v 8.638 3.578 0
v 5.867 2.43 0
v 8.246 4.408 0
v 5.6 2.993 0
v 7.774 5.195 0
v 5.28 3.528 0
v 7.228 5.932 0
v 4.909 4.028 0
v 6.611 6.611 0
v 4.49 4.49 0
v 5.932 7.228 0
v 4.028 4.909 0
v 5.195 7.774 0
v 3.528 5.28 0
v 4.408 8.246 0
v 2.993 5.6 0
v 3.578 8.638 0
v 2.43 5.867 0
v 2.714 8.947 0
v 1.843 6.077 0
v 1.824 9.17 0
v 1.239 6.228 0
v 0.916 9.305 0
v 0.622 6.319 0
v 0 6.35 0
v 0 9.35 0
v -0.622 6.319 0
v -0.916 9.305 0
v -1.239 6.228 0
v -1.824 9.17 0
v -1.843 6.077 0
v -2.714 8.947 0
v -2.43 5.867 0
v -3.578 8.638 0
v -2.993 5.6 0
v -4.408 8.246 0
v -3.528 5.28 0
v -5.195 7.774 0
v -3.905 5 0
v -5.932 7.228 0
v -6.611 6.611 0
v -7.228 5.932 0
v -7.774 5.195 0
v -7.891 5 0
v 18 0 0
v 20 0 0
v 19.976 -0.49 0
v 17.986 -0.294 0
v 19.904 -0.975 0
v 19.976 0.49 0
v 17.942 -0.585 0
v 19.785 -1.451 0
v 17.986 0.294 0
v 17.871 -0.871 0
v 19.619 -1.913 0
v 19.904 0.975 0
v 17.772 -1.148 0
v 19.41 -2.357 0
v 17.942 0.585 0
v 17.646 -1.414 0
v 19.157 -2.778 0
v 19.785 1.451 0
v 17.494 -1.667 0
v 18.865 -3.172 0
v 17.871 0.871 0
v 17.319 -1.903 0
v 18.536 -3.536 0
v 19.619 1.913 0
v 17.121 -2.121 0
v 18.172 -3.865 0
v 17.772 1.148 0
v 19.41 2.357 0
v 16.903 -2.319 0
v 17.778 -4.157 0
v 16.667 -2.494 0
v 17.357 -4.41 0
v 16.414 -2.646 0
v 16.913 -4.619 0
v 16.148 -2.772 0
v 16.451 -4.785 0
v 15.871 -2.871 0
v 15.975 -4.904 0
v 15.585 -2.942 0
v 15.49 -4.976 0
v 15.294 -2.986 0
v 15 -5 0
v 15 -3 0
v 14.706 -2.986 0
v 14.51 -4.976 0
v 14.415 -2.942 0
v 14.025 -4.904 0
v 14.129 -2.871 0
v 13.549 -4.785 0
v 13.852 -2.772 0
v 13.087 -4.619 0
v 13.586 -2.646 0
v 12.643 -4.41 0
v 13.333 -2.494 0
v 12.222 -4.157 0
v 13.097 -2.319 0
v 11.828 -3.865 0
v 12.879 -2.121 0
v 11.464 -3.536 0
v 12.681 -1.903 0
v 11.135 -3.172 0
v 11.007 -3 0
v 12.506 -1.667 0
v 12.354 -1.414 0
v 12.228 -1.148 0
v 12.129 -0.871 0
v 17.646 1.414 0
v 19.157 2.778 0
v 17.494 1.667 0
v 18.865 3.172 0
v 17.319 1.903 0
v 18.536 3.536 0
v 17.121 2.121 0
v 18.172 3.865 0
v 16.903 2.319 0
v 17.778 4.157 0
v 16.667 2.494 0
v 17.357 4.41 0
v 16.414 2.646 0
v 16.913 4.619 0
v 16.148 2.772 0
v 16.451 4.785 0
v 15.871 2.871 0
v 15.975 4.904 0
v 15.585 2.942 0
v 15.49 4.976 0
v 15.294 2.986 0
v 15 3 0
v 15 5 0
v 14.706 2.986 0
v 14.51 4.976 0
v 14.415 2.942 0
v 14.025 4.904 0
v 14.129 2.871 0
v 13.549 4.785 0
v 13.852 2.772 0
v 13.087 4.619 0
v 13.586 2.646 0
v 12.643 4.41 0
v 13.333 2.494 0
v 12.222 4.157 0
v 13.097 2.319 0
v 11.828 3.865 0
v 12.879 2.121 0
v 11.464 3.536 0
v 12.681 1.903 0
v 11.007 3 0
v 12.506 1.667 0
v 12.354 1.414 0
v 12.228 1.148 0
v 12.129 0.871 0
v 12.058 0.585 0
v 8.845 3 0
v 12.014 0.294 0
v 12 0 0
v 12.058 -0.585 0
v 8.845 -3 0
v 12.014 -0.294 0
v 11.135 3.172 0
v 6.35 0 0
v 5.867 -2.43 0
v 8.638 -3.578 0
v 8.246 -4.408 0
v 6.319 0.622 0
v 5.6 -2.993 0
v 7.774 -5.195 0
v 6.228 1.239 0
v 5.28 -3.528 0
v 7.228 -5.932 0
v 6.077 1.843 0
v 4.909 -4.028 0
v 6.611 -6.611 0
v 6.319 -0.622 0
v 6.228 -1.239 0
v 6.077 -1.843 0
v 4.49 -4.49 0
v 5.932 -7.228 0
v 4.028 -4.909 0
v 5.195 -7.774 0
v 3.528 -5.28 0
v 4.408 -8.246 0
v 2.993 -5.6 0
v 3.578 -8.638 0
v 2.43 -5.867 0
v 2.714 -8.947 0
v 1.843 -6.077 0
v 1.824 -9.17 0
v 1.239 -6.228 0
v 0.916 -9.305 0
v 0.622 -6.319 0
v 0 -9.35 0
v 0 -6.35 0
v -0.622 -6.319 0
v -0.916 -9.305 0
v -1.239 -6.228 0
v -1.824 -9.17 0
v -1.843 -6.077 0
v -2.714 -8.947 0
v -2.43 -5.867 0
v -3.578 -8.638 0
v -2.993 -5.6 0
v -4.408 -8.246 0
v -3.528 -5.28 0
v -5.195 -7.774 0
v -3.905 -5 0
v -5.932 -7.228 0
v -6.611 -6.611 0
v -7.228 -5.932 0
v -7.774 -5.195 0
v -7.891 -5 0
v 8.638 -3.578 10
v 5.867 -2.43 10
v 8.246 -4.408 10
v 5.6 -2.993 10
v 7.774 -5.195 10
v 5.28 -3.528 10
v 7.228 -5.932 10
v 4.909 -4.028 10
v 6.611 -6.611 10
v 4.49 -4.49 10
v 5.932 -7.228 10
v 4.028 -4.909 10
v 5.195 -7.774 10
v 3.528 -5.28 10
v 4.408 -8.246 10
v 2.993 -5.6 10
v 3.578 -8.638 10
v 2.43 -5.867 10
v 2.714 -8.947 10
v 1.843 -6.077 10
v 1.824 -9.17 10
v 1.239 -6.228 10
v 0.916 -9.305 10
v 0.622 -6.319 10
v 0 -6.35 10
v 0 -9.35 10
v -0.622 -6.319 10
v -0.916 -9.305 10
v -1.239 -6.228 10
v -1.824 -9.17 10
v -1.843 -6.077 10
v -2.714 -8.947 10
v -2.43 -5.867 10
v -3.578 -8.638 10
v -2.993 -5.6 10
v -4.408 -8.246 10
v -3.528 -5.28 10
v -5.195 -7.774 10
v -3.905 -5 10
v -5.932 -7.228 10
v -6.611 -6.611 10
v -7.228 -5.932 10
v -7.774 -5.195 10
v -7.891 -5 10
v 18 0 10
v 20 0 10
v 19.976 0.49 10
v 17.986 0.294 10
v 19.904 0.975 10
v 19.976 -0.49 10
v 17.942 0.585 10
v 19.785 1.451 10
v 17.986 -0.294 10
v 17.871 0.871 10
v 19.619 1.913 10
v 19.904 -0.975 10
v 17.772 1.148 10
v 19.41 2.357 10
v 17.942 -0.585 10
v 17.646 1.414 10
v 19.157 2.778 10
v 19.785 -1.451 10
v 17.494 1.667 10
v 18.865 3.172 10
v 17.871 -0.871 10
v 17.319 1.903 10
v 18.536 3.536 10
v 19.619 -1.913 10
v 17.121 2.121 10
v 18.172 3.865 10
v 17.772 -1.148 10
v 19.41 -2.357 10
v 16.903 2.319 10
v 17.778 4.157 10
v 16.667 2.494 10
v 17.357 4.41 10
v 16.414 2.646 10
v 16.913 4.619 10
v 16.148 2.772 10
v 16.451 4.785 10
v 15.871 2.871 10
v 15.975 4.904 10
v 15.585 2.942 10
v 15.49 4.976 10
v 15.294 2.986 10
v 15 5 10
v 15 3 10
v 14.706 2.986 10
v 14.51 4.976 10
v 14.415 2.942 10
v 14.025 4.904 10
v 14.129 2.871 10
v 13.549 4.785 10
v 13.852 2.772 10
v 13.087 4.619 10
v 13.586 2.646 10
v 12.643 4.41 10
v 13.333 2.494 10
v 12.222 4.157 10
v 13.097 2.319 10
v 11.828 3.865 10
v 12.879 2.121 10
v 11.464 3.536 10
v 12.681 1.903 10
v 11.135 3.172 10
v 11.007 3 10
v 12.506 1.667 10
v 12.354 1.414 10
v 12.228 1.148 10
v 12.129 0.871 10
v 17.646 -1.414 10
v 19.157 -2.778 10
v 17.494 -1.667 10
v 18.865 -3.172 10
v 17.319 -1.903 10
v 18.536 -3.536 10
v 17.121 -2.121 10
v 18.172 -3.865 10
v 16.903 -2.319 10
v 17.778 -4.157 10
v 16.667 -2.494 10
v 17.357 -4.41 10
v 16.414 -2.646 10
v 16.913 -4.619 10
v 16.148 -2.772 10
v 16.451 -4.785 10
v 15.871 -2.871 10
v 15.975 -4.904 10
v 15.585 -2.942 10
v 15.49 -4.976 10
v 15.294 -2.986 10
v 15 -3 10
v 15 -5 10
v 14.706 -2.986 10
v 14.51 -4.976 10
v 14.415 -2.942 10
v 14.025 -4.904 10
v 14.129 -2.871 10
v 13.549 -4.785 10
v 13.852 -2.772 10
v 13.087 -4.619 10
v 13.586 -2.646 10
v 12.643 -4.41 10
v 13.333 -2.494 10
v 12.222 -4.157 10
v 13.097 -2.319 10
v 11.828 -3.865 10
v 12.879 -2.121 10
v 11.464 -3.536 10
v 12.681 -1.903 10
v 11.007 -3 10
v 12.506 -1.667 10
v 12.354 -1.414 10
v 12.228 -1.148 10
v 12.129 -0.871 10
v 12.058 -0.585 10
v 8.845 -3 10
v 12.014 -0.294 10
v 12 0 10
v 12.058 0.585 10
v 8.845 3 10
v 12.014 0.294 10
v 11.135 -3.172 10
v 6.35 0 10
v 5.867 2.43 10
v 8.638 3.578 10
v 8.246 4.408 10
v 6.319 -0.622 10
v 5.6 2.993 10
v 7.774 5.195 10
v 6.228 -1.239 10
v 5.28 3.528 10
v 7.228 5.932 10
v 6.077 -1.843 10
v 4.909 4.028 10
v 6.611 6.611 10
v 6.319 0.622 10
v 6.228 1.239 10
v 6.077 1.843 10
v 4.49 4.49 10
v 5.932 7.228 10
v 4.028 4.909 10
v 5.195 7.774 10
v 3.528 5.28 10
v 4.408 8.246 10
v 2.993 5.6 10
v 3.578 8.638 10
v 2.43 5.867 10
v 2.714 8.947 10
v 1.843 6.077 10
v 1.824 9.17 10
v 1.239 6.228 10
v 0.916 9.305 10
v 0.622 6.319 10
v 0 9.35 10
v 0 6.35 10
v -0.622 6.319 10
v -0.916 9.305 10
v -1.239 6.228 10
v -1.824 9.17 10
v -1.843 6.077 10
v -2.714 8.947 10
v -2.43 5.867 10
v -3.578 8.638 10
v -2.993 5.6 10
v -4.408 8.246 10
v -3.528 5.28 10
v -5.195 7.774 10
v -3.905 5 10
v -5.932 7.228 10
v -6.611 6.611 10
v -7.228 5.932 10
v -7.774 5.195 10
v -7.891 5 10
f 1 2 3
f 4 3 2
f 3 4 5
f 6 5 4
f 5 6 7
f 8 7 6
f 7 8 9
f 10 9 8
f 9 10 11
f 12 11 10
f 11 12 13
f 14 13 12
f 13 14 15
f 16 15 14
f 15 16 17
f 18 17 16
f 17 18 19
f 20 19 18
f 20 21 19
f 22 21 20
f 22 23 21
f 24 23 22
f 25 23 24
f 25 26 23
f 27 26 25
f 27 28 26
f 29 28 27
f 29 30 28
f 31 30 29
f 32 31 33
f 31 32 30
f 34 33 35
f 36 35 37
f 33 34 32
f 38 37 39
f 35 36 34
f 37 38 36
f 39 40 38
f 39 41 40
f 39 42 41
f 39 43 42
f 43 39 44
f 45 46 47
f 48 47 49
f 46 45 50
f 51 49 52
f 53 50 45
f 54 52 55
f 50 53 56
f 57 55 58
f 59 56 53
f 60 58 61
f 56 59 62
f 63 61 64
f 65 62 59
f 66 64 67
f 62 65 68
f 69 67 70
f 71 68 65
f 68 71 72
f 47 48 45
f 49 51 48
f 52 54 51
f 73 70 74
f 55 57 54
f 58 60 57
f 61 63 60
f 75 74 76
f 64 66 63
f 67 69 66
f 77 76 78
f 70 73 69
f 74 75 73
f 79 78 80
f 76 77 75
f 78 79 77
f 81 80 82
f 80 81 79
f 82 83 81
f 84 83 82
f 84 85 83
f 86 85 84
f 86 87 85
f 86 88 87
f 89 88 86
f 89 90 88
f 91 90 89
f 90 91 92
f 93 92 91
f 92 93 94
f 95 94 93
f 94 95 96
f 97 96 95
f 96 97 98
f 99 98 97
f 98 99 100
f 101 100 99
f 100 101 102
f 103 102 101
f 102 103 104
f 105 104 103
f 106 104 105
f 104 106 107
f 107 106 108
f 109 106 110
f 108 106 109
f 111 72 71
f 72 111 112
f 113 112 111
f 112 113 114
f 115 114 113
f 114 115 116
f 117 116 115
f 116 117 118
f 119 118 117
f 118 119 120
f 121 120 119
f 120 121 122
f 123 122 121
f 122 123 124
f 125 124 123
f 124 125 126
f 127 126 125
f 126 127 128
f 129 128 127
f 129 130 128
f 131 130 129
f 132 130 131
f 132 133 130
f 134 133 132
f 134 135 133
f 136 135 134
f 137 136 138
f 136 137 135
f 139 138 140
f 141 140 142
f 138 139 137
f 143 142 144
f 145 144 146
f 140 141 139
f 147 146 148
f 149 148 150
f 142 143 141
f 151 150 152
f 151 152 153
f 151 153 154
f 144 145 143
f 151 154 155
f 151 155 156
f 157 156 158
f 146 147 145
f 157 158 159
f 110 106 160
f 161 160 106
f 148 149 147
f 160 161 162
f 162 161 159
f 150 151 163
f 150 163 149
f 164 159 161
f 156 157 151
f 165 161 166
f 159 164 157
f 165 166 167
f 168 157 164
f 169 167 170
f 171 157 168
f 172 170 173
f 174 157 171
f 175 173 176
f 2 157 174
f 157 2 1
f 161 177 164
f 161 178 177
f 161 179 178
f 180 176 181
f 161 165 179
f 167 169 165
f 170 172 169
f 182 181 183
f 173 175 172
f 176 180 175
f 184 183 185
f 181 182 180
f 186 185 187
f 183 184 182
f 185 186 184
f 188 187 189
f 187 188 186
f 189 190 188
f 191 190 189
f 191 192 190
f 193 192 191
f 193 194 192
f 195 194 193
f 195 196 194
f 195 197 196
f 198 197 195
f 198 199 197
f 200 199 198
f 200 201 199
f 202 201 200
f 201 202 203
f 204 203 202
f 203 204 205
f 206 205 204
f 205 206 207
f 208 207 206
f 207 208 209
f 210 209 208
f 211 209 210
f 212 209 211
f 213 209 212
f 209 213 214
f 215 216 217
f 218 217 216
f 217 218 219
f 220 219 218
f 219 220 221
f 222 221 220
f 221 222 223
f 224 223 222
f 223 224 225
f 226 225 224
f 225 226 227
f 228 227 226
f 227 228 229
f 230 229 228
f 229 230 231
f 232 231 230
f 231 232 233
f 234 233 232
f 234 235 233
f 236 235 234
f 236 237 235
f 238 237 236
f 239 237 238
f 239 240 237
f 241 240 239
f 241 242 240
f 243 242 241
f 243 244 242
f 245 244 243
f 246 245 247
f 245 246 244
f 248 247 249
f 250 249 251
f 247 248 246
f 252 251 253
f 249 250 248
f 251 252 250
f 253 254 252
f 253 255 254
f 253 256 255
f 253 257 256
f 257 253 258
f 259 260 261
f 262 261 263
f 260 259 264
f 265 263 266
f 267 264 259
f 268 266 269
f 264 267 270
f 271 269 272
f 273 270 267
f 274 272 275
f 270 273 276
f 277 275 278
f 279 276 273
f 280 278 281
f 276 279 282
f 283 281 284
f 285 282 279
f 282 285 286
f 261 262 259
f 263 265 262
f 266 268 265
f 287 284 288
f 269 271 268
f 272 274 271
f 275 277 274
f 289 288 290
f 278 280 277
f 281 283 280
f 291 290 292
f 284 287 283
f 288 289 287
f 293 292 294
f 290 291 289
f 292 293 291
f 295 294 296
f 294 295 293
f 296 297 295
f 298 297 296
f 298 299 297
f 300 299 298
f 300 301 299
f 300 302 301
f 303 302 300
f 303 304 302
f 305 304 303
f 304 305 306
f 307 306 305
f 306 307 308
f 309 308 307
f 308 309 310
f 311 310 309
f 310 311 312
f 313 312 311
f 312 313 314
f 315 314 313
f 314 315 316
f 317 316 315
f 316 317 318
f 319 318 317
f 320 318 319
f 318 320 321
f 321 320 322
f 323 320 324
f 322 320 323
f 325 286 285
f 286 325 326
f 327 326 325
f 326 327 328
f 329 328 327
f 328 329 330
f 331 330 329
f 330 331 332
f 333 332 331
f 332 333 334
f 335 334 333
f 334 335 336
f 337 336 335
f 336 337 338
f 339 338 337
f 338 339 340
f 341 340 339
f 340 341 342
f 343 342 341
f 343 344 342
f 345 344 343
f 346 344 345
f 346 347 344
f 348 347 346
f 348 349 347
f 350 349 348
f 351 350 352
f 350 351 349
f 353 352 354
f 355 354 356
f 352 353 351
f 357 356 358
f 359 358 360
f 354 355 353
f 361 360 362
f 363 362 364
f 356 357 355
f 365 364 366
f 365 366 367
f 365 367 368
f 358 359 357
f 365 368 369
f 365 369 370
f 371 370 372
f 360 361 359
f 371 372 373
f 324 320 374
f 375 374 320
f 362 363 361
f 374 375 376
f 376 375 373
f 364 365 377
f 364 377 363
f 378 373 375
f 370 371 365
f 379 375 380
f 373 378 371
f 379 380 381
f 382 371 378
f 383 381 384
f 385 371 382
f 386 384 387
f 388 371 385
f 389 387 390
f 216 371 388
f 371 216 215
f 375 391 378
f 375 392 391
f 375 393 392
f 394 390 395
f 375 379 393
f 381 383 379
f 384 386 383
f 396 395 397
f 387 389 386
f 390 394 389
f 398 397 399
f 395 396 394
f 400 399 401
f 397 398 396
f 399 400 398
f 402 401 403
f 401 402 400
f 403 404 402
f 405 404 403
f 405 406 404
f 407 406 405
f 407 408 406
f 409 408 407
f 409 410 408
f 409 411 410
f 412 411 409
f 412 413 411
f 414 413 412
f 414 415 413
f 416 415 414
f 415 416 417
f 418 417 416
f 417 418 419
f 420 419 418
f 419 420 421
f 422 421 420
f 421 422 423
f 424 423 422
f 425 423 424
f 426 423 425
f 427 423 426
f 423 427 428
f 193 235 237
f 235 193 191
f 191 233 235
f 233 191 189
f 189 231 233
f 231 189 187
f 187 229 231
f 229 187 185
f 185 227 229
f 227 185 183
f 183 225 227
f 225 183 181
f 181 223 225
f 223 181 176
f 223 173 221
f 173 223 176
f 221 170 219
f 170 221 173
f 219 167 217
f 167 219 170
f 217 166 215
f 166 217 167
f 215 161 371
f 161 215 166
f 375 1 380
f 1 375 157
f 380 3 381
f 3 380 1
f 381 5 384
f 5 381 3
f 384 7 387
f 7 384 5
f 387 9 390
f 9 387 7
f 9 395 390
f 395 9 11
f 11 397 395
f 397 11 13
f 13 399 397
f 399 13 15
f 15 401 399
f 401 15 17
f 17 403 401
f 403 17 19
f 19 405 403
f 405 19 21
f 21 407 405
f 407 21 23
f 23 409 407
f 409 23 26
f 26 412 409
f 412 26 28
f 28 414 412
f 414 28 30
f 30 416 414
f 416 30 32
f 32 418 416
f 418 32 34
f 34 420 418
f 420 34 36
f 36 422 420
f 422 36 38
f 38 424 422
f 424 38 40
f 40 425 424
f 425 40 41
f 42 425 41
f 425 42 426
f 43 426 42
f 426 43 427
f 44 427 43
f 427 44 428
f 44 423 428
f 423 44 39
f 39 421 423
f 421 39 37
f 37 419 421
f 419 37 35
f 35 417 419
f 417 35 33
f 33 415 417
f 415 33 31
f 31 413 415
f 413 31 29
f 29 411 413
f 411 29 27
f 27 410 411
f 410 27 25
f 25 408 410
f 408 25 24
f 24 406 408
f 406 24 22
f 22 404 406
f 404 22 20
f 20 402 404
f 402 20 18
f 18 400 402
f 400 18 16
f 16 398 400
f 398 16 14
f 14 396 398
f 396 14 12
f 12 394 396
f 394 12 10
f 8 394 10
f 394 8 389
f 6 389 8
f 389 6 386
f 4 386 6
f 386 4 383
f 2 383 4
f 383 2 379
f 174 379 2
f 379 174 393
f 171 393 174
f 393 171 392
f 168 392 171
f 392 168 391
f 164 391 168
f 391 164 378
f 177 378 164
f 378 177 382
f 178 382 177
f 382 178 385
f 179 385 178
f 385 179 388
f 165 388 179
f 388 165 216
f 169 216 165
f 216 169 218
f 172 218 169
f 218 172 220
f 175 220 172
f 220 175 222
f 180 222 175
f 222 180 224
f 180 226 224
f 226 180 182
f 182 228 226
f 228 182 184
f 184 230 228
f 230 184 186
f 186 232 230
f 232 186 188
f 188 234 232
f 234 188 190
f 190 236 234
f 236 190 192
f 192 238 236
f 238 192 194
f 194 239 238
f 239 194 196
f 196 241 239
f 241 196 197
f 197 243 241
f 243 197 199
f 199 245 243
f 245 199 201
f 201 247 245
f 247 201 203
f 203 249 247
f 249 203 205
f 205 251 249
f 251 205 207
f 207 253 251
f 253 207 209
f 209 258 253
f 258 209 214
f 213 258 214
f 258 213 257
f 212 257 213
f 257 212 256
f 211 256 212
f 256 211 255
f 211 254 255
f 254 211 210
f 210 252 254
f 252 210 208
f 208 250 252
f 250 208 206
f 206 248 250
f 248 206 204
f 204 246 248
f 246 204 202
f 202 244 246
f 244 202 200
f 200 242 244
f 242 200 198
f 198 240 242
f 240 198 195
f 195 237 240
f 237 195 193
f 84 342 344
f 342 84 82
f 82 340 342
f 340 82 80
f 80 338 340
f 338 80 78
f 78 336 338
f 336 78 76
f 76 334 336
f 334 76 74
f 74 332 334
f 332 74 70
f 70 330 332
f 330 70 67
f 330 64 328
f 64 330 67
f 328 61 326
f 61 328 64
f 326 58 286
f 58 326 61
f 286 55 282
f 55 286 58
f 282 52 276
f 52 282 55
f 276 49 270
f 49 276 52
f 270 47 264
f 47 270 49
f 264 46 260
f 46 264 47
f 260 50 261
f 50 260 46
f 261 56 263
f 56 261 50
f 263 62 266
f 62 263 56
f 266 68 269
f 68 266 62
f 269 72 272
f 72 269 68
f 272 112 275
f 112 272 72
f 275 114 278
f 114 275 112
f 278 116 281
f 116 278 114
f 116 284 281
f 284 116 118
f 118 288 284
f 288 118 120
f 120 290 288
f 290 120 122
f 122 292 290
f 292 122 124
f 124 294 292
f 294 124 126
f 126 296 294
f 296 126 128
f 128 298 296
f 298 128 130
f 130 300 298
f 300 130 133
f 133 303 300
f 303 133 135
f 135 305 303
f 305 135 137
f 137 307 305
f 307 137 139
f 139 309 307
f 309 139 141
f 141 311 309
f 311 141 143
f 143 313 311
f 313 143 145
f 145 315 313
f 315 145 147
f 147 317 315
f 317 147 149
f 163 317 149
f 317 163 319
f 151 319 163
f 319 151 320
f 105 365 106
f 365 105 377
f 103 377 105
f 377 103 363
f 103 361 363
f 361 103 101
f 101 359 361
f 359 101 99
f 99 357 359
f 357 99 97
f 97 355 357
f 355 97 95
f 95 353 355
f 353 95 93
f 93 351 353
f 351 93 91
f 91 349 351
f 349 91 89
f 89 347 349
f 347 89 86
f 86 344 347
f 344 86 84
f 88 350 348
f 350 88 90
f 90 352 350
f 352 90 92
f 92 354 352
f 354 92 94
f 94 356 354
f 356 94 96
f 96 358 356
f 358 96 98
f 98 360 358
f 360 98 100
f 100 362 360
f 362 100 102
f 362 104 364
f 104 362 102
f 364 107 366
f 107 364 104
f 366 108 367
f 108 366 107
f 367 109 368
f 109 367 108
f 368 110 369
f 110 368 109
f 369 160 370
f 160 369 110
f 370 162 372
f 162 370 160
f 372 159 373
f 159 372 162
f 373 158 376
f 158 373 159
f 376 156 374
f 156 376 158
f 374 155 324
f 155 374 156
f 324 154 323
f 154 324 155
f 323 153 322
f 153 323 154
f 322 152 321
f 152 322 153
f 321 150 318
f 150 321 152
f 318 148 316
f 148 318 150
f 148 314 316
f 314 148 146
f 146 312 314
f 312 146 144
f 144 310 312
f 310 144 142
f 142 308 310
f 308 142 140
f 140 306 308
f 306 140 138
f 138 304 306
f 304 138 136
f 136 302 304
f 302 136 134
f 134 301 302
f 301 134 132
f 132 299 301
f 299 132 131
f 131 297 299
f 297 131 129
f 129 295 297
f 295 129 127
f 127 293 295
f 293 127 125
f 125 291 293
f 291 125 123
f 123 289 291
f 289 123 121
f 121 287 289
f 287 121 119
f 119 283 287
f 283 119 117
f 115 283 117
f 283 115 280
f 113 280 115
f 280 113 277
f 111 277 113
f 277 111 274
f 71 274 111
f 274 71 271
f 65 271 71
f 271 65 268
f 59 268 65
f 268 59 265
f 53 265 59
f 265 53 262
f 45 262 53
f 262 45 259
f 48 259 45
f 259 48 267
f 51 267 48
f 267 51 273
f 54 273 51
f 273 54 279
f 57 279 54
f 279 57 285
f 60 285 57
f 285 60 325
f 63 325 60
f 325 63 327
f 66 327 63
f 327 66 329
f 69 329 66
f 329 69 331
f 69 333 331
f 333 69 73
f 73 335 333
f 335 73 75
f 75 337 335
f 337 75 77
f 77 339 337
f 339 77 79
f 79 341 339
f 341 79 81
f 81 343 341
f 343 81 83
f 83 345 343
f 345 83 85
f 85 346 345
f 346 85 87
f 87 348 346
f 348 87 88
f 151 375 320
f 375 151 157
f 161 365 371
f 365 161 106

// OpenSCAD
// Snap-on clip for 12.7mm rod and 6mm tubing
// Corrected to ensure cutouts are fully realized and dimensions match spec.

// --- Dimensions ---
rod_id      = 12.7;    // Inner diameter of the rod ring
rod_wall    = 3.0;     // Wall thickness of the rod ring
rod_od      = rod_id + 2 * rod_wall; // 18.7 mm

rod_gap_w   = 10.0;    // Width of the opening in the rod ring
rod_gap_h   = 10.0;    // Height of the opening in the rod ring

tube_id     = 6.0;     // Inner diameter of the tubing ring
tube_wall   = 2.0;     // Wall thickness of the tubing ring
tube_od     = tube_id + 2 * tube_wall; // 10.0 mm

tube_gap_w  = 4.5;     // Width of the opening in the tubing ring
tube_gap_h  = 4.5;     // Height of the tubing ring opening

bridge_w_y  = 6.0;     // Width of the bridge along the Y axis
bridge_x_min = 8.0;    // Start of the bridge on X axis
bridge_x_max = 12.0;   // End of the bridge on X axis

clip_height = 10.0;    // Extrusion height (Z)
tube_offset_x = 15.0;  // X-coordinate of the tubing ring center

$fn = 64;

// --- Geometry Construction ---

module rod_ring_profile() {
    difference() {
        circle(d = rod_od);
        circle(d = rod_id);
        // Cutout on the -X side: x < 0 and -5 < y < 5
        // To ensure it cuts through the edge, we translate a square 
        // that covers the entire left side of the ring.
        translate([-rod_od - 1, -rod_gap_h/2]) 
            square([rod_od, rod_gap_h]);
    }
}

module tube_ring_profile() {
    difference() {
        circle(d = tube_od);
        circle(d = tube_id);
        // Cutout on the +X side: x > 15 and -2.25 < y < 2.25
        // The center is at (15,0). We translate the square to the right of 15.
        translate([tube_offset_x, -tube_gap_h/2])
            square([tube_od, tube_gap_h]);
    }
}

module bridge_profile() {
    // A rectangle centered on Y, spanning from bridge_x_min to bridge_x_max
    translate([bridge_x_min, -bridge_w_y/2])
        square([bridge_x_max - bridge_x_min, bridge_w_y]);
}

// --- Final Assembly ---

// We use a union of the three parts, then extrude.
// To ensure the rod ring and tube ring are treated as parts of one profile,
// we perform the 2D operations first.

difference() {
    // The main body
    union() {
        linear_extrude(height = clip_height) rod_ring_profile();
        translate([tube_offset_x, 0]) 
            linear_extrude(height = clip_height) tube_ring_profile();
        linear_extrude(height = clip_height) bridge_profile();
    }
    
    // Note: The difference is not needed here because the profiles 
    // are already constructed using difference() in 2D.
}

// To ensure the bridge doesn't block the holes, we must ensure 
// the bridge geometry (x=8 to 12) does not overlap the circle interiors.
// Rod ring OD is 18.7 (radius 9.35). Tube ring ID is 6 (radius 3, so OD is 10).
// Tube ring center is at 15. Tube ring inner edge is at 15 - 3 = 12.
// Bridge ends at 12. They touch but do not overlap the holes.
